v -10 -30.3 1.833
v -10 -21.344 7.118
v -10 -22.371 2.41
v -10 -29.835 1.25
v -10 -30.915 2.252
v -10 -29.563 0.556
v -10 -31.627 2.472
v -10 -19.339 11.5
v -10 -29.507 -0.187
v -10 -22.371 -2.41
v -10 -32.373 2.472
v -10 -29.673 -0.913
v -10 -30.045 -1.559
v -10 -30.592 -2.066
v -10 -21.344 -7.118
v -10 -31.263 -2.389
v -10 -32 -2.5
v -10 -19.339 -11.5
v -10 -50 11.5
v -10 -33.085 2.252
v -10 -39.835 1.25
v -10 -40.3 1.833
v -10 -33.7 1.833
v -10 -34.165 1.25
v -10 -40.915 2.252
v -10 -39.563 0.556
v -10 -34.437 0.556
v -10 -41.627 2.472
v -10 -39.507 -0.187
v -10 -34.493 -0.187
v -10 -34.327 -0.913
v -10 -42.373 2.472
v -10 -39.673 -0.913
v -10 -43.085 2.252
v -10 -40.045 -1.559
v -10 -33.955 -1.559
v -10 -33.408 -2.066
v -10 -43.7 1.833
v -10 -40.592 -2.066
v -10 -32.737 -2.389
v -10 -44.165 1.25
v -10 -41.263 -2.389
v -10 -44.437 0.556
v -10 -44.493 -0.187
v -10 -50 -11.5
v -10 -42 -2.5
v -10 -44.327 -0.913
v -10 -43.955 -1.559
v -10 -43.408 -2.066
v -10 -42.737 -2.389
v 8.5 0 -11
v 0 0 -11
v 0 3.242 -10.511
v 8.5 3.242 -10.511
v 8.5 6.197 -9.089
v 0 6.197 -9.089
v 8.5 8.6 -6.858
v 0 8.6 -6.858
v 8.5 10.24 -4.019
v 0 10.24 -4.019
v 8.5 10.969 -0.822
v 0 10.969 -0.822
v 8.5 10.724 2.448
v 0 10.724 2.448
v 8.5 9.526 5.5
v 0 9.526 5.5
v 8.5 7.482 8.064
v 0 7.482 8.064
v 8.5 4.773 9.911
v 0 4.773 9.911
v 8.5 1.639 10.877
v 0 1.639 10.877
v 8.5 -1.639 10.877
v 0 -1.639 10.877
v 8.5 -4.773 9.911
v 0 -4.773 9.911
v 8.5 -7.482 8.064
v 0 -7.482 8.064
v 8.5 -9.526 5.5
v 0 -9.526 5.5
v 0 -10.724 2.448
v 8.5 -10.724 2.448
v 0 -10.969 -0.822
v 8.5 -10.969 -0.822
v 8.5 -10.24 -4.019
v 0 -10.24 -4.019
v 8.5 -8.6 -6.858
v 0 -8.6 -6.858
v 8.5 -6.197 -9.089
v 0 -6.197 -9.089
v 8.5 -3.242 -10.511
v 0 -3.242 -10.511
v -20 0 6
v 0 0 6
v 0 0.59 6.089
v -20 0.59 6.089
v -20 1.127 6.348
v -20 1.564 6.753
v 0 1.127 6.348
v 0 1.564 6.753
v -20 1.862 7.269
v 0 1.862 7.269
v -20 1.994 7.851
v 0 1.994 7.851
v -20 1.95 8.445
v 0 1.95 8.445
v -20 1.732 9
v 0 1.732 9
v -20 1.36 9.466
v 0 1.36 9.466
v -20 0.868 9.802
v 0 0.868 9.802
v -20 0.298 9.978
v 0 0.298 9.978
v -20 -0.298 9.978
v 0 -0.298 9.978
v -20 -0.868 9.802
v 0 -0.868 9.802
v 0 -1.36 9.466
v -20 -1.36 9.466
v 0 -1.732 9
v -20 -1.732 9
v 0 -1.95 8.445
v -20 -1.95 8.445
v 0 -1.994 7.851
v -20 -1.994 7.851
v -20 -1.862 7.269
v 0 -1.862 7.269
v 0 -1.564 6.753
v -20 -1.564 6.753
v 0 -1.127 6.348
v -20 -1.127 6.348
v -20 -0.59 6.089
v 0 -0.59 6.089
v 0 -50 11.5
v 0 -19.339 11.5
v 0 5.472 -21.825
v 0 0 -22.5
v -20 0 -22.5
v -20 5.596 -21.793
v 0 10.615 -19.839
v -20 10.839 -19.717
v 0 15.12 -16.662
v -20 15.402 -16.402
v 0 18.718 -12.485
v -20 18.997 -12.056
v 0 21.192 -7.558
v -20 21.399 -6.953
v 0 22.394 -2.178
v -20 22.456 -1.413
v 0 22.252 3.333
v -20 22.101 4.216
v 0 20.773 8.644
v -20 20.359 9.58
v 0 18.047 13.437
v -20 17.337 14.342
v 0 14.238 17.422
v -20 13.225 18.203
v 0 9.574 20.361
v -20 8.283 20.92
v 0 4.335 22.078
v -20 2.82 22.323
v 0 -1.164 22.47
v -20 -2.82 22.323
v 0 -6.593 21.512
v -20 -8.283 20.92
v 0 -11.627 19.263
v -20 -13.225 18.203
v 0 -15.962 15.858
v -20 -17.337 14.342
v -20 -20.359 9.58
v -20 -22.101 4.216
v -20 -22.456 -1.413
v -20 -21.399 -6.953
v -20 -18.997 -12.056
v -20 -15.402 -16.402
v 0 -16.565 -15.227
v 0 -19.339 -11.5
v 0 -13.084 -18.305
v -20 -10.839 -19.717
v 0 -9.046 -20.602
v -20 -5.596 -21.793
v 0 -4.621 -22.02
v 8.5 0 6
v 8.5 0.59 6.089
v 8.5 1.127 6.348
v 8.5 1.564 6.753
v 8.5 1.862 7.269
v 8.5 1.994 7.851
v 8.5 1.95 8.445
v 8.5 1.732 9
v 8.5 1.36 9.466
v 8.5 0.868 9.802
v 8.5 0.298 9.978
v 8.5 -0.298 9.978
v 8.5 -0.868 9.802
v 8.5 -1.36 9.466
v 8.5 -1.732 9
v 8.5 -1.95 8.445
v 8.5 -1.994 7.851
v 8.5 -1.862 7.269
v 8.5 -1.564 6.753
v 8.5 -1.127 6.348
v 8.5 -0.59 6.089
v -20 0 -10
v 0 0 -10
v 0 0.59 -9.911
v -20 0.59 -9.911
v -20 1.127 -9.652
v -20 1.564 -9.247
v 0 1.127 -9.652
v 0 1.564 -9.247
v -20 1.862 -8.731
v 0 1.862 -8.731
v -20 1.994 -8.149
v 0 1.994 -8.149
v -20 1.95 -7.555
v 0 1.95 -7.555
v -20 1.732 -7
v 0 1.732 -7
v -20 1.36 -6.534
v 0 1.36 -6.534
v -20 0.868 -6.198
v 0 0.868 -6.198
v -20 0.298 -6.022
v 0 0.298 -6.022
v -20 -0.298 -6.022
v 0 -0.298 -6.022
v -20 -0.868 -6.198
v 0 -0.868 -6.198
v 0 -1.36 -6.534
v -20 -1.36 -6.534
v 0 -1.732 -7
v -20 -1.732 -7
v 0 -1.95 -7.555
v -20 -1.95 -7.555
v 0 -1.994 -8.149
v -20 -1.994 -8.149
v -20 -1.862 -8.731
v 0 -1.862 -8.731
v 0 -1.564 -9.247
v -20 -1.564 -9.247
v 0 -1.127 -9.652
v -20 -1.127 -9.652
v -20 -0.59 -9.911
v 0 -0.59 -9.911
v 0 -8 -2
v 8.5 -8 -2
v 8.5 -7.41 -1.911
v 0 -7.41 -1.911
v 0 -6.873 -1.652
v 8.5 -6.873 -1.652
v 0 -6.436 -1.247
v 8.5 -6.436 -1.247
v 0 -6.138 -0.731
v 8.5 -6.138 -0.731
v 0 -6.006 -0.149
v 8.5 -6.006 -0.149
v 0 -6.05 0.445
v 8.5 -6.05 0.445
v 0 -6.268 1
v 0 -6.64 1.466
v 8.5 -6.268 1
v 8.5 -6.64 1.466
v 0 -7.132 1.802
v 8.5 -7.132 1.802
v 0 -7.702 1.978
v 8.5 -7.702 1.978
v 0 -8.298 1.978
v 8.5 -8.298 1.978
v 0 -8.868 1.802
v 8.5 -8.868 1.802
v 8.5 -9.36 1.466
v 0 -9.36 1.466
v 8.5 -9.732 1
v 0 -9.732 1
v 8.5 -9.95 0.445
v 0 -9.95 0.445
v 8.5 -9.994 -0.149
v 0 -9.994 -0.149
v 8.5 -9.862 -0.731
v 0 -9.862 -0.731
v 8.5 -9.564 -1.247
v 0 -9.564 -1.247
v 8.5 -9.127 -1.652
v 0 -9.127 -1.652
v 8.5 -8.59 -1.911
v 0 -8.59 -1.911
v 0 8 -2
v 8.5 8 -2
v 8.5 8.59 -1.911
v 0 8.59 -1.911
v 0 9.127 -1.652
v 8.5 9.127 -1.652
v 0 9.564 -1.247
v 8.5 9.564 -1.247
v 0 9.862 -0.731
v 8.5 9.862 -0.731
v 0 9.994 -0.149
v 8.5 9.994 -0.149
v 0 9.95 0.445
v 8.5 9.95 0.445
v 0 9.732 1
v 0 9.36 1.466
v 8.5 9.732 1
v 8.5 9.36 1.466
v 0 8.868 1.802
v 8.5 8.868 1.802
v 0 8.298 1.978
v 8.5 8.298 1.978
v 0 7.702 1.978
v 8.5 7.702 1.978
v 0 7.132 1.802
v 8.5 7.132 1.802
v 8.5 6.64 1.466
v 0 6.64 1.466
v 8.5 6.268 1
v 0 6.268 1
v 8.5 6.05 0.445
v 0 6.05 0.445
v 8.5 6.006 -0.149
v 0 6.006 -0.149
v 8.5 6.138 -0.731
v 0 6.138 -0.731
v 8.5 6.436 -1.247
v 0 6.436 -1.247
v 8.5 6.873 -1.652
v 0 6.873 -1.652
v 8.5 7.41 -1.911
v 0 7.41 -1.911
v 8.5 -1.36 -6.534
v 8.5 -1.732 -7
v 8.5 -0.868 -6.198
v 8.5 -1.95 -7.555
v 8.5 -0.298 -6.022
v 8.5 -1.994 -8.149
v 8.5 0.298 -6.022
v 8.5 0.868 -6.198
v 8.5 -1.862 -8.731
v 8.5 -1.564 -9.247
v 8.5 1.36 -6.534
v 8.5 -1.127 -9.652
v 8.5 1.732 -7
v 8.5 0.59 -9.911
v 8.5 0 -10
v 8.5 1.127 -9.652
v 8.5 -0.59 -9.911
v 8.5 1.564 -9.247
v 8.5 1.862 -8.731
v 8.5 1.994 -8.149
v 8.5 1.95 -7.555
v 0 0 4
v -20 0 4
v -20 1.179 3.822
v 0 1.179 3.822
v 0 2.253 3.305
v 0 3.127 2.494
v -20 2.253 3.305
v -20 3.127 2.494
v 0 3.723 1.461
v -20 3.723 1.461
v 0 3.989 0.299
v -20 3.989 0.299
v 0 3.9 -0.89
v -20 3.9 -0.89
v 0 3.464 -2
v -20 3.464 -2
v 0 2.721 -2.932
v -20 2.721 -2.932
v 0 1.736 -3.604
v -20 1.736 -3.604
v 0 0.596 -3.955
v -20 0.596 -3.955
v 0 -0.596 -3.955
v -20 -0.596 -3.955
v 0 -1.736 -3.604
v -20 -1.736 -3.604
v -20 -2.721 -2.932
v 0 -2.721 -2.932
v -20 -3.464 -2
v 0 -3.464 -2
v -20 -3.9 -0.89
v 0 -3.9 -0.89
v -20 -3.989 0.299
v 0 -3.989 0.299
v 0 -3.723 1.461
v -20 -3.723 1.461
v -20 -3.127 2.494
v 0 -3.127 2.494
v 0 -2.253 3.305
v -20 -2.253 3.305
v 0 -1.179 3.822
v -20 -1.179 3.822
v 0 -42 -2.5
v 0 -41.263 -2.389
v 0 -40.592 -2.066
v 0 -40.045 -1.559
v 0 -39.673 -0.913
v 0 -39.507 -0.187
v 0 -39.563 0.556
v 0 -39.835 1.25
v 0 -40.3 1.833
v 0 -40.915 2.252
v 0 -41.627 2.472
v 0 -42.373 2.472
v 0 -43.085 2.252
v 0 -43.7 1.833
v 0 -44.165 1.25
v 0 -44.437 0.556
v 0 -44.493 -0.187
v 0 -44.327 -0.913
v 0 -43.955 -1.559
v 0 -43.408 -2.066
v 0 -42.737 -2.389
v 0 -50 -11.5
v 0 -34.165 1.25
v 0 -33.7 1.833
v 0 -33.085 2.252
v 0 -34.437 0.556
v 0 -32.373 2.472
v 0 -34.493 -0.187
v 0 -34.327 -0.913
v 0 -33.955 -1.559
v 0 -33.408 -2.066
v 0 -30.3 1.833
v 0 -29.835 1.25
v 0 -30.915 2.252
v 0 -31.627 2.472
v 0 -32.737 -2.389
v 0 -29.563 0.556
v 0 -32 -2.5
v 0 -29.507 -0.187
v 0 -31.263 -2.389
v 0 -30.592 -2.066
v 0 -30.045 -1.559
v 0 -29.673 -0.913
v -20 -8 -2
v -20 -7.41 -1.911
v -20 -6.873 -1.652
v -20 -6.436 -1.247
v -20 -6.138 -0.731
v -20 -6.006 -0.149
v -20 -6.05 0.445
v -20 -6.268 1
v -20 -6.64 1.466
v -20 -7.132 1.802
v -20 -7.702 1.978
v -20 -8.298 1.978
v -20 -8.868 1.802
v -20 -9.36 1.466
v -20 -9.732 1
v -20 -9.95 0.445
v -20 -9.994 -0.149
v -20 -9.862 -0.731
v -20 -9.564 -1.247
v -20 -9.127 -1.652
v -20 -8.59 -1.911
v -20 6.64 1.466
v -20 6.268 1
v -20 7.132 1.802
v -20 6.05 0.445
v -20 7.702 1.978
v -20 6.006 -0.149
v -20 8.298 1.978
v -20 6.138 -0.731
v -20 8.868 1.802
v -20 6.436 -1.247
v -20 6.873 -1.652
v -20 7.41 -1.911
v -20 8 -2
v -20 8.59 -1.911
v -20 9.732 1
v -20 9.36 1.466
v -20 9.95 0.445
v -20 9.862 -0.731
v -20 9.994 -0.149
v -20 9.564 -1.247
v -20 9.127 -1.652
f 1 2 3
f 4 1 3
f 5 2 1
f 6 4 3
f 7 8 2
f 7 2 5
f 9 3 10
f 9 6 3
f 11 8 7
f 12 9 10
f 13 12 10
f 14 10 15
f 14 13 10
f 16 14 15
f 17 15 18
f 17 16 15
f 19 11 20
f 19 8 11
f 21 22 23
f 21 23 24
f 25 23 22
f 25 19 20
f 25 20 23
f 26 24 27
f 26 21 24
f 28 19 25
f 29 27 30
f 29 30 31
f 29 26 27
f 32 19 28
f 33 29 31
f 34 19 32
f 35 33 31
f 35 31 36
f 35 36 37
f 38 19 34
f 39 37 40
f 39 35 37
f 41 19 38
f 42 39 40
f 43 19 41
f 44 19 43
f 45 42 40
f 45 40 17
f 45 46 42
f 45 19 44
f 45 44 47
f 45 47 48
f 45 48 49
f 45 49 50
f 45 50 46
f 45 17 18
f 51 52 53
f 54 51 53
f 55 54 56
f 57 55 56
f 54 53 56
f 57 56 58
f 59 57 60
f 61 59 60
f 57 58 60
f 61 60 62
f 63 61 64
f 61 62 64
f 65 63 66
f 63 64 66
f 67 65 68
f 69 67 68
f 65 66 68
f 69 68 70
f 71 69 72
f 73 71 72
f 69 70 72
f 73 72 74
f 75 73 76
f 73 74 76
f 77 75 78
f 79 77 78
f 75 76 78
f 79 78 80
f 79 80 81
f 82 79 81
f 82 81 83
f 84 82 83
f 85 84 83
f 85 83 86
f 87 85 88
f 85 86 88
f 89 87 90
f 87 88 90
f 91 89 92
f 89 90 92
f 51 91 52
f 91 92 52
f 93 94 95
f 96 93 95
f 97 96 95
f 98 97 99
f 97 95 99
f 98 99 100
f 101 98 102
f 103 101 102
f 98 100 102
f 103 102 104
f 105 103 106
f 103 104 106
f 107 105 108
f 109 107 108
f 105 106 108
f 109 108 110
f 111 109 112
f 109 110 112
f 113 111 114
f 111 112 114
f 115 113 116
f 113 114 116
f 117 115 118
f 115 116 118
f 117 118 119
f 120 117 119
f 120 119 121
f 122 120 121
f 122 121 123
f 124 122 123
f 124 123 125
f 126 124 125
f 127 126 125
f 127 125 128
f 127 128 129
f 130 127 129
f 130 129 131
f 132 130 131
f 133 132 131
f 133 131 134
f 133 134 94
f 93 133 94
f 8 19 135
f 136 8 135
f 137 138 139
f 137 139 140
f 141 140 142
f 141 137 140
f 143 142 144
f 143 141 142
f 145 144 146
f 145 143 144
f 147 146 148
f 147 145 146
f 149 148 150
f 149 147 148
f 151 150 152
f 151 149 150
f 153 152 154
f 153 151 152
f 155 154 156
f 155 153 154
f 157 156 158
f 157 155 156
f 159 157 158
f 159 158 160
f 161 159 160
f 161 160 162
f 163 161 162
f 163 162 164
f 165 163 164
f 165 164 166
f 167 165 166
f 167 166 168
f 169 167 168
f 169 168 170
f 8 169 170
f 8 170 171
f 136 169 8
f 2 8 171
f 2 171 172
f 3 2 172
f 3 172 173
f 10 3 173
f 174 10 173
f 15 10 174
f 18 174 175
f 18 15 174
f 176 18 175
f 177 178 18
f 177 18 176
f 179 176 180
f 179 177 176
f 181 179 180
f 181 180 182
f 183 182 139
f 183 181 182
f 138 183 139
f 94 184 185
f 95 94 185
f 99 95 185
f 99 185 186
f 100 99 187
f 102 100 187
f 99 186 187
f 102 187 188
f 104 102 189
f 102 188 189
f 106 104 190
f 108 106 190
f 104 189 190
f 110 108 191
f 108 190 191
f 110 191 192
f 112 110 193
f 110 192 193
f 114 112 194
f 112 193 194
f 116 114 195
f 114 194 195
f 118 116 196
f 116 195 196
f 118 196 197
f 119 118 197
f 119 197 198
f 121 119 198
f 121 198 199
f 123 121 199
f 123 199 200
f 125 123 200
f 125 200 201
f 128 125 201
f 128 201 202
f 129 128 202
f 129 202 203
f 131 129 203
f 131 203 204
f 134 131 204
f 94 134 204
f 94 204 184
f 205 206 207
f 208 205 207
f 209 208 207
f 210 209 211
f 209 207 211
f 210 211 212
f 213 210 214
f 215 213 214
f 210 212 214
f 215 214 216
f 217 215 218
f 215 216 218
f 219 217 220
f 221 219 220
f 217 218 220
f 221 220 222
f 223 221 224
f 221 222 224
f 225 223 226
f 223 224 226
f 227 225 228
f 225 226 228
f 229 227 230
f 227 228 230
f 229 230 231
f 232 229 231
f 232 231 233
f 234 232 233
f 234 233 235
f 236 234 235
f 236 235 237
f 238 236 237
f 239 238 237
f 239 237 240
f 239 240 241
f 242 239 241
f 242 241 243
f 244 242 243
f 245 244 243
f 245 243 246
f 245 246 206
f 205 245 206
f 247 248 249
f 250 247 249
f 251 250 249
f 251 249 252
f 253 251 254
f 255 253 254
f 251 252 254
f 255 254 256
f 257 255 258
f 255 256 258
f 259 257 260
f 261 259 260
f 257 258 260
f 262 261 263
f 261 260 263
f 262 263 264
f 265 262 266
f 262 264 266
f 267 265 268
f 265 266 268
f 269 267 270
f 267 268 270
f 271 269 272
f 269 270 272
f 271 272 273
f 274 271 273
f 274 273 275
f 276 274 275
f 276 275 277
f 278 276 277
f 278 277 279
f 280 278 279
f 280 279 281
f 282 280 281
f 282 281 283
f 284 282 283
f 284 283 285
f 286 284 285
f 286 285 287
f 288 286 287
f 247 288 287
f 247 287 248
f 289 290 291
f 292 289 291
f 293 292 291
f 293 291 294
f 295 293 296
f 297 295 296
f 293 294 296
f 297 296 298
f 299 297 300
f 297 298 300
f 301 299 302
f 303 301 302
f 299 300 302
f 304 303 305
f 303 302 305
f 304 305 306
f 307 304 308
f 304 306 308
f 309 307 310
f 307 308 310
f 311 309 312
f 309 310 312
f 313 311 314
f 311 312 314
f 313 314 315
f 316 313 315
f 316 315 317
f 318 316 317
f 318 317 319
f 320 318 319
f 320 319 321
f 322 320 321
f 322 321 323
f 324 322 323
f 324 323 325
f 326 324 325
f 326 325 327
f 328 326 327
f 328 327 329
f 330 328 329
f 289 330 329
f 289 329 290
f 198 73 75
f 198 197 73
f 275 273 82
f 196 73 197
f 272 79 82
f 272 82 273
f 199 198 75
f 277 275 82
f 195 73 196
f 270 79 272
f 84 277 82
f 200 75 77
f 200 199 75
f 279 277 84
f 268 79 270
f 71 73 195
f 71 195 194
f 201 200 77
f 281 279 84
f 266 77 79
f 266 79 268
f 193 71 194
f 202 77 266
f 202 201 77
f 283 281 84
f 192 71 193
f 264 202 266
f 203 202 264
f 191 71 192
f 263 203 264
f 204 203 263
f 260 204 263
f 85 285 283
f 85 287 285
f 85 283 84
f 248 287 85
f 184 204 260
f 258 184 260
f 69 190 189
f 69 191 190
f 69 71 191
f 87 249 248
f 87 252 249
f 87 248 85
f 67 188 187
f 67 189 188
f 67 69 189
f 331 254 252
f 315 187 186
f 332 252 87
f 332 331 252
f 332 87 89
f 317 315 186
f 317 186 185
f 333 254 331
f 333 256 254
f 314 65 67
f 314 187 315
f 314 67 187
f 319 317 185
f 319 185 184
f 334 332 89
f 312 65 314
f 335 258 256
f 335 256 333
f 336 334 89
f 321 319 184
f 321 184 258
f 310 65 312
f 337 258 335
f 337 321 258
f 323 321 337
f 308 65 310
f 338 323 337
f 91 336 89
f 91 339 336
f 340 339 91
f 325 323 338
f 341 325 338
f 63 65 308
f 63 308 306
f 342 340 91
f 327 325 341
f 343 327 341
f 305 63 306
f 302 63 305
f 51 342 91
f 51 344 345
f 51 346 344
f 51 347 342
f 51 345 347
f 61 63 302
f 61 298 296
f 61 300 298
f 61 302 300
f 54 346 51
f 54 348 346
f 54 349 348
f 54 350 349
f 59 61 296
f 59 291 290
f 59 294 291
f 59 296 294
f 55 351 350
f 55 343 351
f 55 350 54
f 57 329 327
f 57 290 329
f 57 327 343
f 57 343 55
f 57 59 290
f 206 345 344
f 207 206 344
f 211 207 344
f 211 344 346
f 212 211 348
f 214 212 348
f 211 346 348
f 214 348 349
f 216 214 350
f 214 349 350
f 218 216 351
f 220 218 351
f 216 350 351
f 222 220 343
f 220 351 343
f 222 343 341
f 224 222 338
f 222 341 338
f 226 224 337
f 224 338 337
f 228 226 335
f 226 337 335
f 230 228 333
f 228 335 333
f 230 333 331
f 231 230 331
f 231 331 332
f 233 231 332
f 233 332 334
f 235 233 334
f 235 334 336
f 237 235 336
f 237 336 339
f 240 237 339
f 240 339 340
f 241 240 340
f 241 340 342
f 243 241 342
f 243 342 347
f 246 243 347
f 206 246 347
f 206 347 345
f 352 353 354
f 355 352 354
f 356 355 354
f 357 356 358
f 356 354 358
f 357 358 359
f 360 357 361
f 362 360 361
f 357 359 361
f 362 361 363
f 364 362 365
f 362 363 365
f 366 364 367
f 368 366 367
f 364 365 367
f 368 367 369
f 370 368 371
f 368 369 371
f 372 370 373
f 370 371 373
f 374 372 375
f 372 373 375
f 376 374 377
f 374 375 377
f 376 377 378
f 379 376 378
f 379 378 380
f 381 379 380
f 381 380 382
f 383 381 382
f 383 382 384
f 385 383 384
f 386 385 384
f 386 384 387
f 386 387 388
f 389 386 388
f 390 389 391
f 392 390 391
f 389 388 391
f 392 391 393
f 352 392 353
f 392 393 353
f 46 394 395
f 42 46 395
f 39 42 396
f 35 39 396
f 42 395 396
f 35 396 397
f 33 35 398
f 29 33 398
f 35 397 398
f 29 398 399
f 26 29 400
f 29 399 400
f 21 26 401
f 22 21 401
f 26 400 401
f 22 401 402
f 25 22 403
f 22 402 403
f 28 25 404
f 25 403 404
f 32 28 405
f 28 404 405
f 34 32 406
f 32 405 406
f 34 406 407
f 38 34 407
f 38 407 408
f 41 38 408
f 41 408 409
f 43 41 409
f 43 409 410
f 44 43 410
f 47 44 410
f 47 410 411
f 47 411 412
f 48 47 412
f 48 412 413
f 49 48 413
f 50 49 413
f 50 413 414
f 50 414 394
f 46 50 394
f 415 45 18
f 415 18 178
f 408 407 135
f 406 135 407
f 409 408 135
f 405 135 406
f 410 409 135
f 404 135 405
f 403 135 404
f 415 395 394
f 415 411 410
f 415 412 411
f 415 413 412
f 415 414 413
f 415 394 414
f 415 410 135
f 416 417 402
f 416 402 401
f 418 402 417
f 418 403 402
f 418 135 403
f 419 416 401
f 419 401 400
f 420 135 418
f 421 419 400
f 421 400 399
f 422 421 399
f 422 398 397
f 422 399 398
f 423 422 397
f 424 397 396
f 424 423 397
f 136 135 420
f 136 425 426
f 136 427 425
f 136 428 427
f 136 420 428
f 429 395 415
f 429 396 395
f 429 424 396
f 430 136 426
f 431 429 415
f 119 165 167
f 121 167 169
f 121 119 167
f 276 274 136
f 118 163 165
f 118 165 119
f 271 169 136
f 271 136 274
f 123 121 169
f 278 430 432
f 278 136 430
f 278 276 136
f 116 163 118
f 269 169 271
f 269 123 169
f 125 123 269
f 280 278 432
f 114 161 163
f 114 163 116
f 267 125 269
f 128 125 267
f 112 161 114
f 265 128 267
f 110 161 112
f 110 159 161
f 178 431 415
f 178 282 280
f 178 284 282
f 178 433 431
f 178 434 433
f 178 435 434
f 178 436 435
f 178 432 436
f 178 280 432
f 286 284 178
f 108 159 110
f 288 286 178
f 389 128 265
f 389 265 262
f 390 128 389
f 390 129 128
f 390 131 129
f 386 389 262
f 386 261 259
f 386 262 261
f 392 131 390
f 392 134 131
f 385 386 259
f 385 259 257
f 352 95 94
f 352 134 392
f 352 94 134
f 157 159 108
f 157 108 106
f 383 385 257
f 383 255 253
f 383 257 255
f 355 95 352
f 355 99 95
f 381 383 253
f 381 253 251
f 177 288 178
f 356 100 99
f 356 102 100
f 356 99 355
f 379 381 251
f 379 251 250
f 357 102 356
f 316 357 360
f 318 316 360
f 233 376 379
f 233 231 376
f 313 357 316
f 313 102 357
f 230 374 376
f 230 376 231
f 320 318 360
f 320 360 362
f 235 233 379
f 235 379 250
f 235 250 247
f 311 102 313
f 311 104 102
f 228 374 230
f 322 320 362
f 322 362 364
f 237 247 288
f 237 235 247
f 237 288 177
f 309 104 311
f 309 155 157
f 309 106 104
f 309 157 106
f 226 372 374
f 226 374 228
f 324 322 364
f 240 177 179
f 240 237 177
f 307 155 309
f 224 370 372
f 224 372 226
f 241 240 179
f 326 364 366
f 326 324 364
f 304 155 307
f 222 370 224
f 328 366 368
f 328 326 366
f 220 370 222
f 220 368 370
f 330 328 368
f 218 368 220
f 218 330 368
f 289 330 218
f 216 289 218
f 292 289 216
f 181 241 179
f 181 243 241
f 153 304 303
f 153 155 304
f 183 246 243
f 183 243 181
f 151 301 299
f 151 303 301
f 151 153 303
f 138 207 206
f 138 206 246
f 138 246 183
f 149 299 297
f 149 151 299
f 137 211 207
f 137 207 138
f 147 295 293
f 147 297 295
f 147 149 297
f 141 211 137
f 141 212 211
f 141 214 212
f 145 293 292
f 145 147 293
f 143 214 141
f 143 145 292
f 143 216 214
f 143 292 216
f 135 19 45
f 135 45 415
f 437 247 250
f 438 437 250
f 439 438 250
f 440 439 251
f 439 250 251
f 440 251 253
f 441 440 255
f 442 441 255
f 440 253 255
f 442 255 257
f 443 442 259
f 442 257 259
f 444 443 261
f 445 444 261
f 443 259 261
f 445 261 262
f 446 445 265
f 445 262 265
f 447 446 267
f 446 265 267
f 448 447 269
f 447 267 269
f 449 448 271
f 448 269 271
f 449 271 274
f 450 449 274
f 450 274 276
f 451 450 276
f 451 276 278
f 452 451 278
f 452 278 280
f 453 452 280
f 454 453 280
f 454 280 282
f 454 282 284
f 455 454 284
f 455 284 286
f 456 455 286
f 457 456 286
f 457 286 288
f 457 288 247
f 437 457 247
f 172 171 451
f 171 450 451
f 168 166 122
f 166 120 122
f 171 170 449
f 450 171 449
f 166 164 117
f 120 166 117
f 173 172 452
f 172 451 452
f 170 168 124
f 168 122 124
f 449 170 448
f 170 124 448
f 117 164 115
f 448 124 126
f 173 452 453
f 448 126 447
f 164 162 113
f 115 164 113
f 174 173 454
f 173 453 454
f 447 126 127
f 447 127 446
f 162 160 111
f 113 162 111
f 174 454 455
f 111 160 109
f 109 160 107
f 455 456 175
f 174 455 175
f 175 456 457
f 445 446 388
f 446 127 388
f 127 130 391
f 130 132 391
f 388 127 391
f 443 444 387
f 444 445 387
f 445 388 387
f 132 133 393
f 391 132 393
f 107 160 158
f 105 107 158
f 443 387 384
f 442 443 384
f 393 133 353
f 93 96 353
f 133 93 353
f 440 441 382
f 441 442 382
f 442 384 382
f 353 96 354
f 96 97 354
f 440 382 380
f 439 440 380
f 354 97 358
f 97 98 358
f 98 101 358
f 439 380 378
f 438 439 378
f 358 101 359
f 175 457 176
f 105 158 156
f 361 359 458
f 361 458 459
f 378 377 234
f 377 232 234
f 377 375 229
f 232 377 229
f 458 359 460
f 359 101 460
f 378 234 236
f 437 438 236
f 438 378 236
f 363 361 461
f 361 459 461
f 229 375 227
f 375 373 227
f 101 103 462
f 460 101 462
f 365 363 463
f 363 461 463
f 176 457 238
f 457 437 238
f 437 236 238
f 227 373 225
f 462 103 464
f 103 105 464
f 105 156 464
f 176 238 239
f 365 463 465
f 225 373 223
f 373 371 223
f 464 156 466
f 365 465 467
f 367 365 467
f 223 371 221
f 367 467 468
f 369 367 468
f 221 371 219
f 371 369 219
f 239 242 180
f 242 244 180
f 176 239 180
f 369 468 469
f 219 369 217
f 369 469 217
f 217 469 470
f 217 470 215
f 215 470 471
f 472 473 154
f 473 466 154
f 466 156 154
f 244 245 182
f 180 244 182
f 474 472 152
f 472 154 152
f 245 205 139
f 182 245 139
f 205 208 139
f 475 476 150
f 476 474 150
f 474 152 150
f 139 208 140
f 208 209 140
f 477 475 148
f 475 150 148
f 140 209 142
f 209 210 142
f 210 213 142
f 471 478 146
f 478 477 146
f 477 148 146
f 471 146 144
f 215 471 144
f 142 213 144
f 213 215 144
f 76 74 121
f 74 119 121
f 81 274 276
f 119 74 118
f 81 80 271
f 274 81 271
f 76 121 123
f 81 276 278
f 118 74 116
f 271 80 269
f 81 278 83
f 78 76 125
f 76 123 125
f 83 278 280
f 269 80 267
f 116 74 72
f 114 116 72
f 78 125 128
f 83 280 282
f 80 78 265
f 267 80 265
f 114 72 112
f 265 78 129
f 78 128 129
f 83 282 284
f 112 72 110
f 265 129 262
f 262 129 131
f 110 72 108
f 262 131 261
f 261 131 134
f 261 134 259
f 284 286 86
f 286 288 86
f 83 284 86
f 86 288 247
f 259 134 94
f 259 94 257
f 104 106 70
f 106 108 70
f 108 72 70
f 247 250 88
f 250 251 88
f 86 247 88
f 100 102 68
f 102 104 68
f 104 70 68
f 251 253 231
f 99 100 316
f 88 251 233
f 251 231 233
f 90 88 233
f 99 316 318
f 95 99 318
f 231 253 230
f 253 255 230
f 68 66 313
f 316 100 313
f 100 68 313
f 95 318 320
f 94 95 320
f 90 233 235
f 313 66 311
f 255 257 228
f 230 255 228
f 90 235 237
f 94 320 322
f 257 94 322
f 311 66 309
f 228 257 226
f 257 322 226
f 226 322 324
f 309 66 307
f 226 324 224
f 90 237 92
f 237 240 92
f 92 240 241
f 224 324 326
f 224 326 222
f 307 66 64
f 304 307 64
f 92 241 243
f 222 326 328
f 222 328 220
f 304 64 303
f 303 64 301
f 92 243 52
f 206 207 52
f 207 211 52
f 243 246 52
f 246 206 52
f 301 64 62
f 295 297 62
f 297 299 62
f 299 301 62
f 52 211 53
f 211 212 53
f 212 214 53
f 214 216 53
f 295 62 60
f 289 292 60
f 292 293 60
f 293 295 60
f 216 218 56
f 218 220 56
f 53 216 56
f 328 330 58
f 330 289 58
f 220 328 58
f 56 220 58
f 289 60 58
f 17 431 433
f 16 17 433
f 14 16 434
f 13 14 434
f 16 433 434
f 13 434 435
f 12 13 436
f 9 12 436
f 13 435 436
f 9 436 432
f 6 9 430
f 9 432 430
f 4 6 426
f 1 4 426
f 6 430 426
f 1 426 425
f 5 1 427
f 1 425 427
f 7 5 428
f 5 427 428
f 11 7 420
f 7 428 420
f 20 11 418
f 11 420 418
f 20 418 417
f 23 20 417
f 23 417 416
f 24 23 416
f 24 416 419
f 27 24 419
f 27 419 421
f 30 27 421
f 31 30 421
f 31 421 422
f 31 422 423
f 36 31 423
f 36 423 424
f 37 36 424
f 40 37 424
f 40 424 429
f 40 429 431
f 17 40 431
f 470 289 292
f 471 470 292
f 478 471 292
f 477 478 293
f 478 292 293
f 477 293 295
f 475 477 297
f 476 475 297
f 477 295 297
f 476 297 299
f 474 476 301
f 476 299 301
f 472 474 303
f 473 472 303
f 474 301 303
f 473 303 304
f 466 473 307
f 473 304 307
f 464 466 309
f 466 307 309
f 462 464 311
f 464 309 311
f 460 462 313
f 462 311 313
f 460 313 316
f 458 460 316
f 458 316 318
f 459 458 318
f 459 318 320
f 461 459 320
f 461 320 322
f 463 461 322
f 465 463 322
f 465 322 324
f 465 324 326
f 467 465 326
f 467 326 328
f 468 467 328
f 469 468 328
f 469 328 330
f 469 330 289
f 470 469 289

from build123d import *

# Parameters (mm, degrees)
SKETCH2_R                 = 22.5
BOSS_EXTRUDE8_DEPTH       = 20
SKETCH2_10_R              = 11
BOSS_EXTRUDE9_DEPTH       = 8.5
BOSS_EXTRUDE10_REACH      = 80.502
BOSS_EXTRUDE10_END_RADIUS = 22.5
SKETCH8_W                 = 10
SKETCH8_H                 = 23
SKETCH9_R                 = 2.5
CUT_EXTRUDE3_DEPTH        = 59.36308765
SKETCH10_R                = 4
CUT_EXTRUDE4_DEPTH        = 20
SKETCH11_R                = 2
CUT_EXTRUDE7_DEPTH        = 62.794012655


with BuildPart() as part:
    # Sketch2 → Boss-Extrude8 (new body)
    with BuildSketch(Plane(origin=(0, 0, 0), x_dir=(0, 0, -1), z_dir=(1, 0, 0))):
        Circle(SKETCH2_R)
    extrude(amount=-BOSS_EXTRUDE8_DEPTH)

    # Boss-Extrude10: up to this cylinder (the profile starts outside it)
    boss_extrude10_end = Plane(origin=(-5, 0, 0), z_dir=(1, 0, 0)) * Cylinder(BOSS_EXTRUDE10_END_RADIUS, 207.004, mode=Mode.PRIVATE)
    # Sketch8 → Boss-Extrude10 (add, up to the surface)
    with BuildSketch(Plane(origin=(0, -50, 0), x_dir=(1, 0, 0), z_dir=(0, 1, 0)), mode=Mode.PRIVATE) as boss_extrude10_sk1:
        with Locations((-5, 0)):
            Rectangle(SKETCH8_W, SKETCH8_H)
    boss_extrude10_tool1 = extrude(boss_extrude10_sk1.sketch, amount=BOSS_EXTRUDE10_REACH, mode=Mode.PRIVATE) - boss_extrude10_end
    add(boss_extrude10_tool1.solids().sort_by_distance((-5, -50, 0))[0])

    # Sketch9 → Cut-Extrude3 (cut, through all)
    with BuildSketch(Plane(origin=(0, 0, 0), x_dir=(0, 0, -1), z_dir=(1, 0, 0))):
        with Locations((0, -42)):
            Circle(SKETCH9_R)
        with Locations((0, -32)):
            Circle(SKETCH9_R)
    extrude(amount=-CUT_EXTRUDE3_DEPTH, mode=Mode.SUBTRACT)

    # Sketch10 → Cut-Extrude4 (cut)
    with BuildSketch(Plane.ZY.offset(20)):
        Circle(SKETCH10_R)
    extrude(amount=-CUT_EXTRUDE4_DEPTH, mode=Mode.SUBTRACT)


with BuildPart() as body_2:
    # Sketch2<10> → Boss-Extrude9 (new body)
    with BuildSketch(Plane(origin=(0, 0, 0), x_dir=(0, 0, -1), z_dir=(1, 0, 0))):
        Circle(SKETCH2_10_R)
    extrude(amount=BOSS_EXTRUDE9_DEPTH)


with BuildPart() as cut_extrude7_tool:
    # Sketch11 → Cut-Extrude7 (new, through all)
    with BuildSketch(Plane(origin=(8.5, 0, 0), x_dir=(0, 0, -1), z_dir=(1, 0, 0))):
        with Locations((0, 8)):
            Circle(SKETCH11_R)
        with Locations((8, 0)):
            Circle(SKETCH11_R)
        with Locations((0, -8)):
            Circle(SKETCH11_R)
        with Locations((-8, 0)):
            Circle(SKETCH11_R)
    extrude(amount=-CUT_EXTRUDE7_DEPTH)


with BuildPart() as part_1:
    add(part.part)

    # Cut-Extrude7: cut by cut_extrude7_tool
    add(cut_extrude7_tool.part, mode=Mode.SUBTRACT)


with BuildPart() as body_2_1:
    add(body_2.part)

    # Cut-Extrude7: cut by cut_extrude7_tool
    add(cut_extrude7_tool.part, mode=Mode.SUBTRACT)


solid = Compound([part_1.part, body_2_1.part])
